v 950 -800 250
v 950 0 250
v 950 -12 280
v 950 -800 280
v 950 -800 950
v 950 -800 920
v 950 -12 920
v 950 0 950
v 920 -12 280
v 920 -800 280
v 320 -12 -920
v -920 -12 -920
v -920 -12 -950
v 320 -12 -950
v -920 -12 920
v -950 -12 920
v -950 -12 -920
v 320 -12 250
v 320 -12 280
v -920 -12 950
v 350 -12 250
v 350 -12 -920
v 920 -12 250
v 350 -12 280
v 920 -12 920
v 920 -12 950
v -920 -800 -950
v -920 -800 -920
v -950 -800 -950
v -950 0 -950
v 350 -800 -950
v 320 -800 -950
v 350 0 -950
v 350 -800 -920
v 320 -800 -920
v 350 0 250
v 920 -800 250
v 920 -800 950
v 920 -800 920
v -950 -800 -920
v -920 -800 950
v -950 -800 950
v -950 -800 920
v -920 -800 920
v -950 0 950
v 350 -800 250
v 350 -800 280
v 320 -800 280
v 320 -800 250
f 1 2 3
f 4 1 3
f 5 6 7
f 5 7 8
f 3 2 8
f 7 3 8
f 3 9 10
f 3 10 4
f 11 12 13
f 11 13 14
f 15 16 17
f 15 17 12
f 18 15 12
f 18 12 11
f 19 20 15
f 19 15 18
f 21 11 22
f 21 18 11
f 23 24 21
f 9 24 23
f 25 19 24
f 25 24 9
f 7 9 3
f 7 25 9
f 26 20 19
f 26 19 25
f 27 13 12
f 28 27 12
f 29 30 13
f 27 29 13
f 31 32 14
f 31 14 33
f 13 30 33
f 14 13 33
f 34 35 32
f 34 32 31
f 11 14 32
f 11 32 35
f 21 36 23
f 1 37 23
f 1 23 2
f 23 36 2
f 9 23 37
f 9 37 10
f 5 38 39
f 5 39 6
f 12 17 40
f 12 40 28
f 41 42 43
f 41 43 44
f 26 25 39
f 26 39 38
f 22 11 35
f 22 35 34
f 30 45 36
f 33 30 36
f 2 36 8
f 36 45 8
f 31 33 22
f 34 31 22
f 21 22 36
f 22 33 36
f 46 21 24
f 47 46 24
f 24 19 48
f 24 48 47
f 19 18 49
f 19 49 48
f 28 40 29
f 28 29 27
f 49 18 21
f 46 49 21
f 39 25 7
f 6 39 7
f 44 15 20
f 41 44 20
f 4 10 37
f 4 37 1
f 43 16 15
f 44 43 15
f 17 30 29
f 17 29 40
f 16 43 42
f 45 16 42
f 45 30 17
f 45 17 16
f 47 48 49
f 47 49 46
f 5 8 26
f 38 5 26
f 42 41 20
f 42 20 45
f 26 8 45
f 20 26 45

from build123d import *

# Parameters (mm, degrees)
F0_W     = 30
F0_H     = 30
F1_DEPTH = 800
F2_DEPTH = 12
F0_H_2   = 1170
F3_DEPTH = 12


with BuildPart() as f1:
    # F0 (on Front) → F1 (new body)
    with BuildSketch(Plane.XZ):
        with Locations((-935, 935)):
            Rectangle(F0_W, F0_H)
    extrude(amount=F1_DEPTH)



with BuildPart() as f1b:
    # F0 (on Front) → F1, piece 2 (new body)
    with BuildSketch(Plane.XZ):
        with Locations((935, 935)):
            Rectangle(F0_W, F0_H)
    extrude(amount=F1_DEPTH)


with BuildPart() as f1c:
    # F0 (on Front) → F1, piece 3 (new body)
    with BuildSketch(Plane.XZ):
        with Locations((935, 265)):
            Rectangle(F0_W, F0_H)
    extrude(amount=F1_DEPTH)


with BuildPart() as f1d:
    # F0 (on Front) → F1, piece 4 (new body)
    with BuildSketch(Plane.XZ):
        with Locations((335, 265)):
            Rectangle(F0_W, F0_H)
    extrude(amount=F1_DEPTH)


with BuildPart() as f1e:
    # F0 (on Front) → F1, piece 5 (new body)
    with BuildSketch(Plane.XZ):
        with Locations((335, -935)):
            Rectangle(F0_W, F0_H)
    extrude(amount=F1_DEPTH)


with BuildPart() as f1f:
    # F0 (on Front) → F1, piece 6 (new body)
    with BuildSketch(Plane.XZ):
        with Locations((-935, -935)):
            Rectangle(F0_W, F0_H)
    extrude(amount=F1_DEPTH)


with BuildPart() as f1_1:
    add(f1.part)

    add(f1b.part)  # F2 merges F1b

    add(f1c.part)  # F2 merges F1c

    add(f1d.part)  # F2 merges F1d

    add(f1e.part)  # F2 merges F1e

    add(f1f.part)  # F2 merges F1f
    # F0 (on Front) → F2 (join)
    with BuildSketch(Plane.XZ):
        Polygon((-920, -920), (-920, -950), (320, -950), (320, -920), (320, 250), (320, 280), (350, 280), (350, 250), (920, 250), (920, 280), (950, 280), (950, 920), (920, 920), (920, 950), (-920, 950), (-920, 920), (-950, 920), (-950, -920), align=None)
    extrude(amount=F2_DEPTH)

    # F0 (on Front) → F3 (join)
    with BuildSketch(Plane.XZ):
        Polygon((-920, -920), (-920, -950), (320, -950), (320, -920), (320, 250), (320, 280), (350, 280), (350, 250), (920, 250), (920, 280), (950, 280), (950, 920), (920, 920), (920, 950), (-920, 950), (-920, 920), (-950, 920), (-950, -920), align=None)
        with Locations((335, -335)):
            Rectangle(F0_W, F0_H_2)
        with Locations((335, -935)):
            Rectangle(F0_W, F0_H)
        with Locations((335, 265)):
            Rectangle(F0_W, F0_H)
        with Locations((935, 265)):
            Rectangle(F0_W, F0_H)
        with Locations((-935, -935)):
            Rectangle(F0_W, F0_H)
        with Locations((935, 935)):
            Rectangle(F0_W, F0_H)
        with Locations((-935, 935)):
            Rectangle(F0_W, F0_H)
    extrude(amount=F3_DEPTH)


solid = f1_1.part
